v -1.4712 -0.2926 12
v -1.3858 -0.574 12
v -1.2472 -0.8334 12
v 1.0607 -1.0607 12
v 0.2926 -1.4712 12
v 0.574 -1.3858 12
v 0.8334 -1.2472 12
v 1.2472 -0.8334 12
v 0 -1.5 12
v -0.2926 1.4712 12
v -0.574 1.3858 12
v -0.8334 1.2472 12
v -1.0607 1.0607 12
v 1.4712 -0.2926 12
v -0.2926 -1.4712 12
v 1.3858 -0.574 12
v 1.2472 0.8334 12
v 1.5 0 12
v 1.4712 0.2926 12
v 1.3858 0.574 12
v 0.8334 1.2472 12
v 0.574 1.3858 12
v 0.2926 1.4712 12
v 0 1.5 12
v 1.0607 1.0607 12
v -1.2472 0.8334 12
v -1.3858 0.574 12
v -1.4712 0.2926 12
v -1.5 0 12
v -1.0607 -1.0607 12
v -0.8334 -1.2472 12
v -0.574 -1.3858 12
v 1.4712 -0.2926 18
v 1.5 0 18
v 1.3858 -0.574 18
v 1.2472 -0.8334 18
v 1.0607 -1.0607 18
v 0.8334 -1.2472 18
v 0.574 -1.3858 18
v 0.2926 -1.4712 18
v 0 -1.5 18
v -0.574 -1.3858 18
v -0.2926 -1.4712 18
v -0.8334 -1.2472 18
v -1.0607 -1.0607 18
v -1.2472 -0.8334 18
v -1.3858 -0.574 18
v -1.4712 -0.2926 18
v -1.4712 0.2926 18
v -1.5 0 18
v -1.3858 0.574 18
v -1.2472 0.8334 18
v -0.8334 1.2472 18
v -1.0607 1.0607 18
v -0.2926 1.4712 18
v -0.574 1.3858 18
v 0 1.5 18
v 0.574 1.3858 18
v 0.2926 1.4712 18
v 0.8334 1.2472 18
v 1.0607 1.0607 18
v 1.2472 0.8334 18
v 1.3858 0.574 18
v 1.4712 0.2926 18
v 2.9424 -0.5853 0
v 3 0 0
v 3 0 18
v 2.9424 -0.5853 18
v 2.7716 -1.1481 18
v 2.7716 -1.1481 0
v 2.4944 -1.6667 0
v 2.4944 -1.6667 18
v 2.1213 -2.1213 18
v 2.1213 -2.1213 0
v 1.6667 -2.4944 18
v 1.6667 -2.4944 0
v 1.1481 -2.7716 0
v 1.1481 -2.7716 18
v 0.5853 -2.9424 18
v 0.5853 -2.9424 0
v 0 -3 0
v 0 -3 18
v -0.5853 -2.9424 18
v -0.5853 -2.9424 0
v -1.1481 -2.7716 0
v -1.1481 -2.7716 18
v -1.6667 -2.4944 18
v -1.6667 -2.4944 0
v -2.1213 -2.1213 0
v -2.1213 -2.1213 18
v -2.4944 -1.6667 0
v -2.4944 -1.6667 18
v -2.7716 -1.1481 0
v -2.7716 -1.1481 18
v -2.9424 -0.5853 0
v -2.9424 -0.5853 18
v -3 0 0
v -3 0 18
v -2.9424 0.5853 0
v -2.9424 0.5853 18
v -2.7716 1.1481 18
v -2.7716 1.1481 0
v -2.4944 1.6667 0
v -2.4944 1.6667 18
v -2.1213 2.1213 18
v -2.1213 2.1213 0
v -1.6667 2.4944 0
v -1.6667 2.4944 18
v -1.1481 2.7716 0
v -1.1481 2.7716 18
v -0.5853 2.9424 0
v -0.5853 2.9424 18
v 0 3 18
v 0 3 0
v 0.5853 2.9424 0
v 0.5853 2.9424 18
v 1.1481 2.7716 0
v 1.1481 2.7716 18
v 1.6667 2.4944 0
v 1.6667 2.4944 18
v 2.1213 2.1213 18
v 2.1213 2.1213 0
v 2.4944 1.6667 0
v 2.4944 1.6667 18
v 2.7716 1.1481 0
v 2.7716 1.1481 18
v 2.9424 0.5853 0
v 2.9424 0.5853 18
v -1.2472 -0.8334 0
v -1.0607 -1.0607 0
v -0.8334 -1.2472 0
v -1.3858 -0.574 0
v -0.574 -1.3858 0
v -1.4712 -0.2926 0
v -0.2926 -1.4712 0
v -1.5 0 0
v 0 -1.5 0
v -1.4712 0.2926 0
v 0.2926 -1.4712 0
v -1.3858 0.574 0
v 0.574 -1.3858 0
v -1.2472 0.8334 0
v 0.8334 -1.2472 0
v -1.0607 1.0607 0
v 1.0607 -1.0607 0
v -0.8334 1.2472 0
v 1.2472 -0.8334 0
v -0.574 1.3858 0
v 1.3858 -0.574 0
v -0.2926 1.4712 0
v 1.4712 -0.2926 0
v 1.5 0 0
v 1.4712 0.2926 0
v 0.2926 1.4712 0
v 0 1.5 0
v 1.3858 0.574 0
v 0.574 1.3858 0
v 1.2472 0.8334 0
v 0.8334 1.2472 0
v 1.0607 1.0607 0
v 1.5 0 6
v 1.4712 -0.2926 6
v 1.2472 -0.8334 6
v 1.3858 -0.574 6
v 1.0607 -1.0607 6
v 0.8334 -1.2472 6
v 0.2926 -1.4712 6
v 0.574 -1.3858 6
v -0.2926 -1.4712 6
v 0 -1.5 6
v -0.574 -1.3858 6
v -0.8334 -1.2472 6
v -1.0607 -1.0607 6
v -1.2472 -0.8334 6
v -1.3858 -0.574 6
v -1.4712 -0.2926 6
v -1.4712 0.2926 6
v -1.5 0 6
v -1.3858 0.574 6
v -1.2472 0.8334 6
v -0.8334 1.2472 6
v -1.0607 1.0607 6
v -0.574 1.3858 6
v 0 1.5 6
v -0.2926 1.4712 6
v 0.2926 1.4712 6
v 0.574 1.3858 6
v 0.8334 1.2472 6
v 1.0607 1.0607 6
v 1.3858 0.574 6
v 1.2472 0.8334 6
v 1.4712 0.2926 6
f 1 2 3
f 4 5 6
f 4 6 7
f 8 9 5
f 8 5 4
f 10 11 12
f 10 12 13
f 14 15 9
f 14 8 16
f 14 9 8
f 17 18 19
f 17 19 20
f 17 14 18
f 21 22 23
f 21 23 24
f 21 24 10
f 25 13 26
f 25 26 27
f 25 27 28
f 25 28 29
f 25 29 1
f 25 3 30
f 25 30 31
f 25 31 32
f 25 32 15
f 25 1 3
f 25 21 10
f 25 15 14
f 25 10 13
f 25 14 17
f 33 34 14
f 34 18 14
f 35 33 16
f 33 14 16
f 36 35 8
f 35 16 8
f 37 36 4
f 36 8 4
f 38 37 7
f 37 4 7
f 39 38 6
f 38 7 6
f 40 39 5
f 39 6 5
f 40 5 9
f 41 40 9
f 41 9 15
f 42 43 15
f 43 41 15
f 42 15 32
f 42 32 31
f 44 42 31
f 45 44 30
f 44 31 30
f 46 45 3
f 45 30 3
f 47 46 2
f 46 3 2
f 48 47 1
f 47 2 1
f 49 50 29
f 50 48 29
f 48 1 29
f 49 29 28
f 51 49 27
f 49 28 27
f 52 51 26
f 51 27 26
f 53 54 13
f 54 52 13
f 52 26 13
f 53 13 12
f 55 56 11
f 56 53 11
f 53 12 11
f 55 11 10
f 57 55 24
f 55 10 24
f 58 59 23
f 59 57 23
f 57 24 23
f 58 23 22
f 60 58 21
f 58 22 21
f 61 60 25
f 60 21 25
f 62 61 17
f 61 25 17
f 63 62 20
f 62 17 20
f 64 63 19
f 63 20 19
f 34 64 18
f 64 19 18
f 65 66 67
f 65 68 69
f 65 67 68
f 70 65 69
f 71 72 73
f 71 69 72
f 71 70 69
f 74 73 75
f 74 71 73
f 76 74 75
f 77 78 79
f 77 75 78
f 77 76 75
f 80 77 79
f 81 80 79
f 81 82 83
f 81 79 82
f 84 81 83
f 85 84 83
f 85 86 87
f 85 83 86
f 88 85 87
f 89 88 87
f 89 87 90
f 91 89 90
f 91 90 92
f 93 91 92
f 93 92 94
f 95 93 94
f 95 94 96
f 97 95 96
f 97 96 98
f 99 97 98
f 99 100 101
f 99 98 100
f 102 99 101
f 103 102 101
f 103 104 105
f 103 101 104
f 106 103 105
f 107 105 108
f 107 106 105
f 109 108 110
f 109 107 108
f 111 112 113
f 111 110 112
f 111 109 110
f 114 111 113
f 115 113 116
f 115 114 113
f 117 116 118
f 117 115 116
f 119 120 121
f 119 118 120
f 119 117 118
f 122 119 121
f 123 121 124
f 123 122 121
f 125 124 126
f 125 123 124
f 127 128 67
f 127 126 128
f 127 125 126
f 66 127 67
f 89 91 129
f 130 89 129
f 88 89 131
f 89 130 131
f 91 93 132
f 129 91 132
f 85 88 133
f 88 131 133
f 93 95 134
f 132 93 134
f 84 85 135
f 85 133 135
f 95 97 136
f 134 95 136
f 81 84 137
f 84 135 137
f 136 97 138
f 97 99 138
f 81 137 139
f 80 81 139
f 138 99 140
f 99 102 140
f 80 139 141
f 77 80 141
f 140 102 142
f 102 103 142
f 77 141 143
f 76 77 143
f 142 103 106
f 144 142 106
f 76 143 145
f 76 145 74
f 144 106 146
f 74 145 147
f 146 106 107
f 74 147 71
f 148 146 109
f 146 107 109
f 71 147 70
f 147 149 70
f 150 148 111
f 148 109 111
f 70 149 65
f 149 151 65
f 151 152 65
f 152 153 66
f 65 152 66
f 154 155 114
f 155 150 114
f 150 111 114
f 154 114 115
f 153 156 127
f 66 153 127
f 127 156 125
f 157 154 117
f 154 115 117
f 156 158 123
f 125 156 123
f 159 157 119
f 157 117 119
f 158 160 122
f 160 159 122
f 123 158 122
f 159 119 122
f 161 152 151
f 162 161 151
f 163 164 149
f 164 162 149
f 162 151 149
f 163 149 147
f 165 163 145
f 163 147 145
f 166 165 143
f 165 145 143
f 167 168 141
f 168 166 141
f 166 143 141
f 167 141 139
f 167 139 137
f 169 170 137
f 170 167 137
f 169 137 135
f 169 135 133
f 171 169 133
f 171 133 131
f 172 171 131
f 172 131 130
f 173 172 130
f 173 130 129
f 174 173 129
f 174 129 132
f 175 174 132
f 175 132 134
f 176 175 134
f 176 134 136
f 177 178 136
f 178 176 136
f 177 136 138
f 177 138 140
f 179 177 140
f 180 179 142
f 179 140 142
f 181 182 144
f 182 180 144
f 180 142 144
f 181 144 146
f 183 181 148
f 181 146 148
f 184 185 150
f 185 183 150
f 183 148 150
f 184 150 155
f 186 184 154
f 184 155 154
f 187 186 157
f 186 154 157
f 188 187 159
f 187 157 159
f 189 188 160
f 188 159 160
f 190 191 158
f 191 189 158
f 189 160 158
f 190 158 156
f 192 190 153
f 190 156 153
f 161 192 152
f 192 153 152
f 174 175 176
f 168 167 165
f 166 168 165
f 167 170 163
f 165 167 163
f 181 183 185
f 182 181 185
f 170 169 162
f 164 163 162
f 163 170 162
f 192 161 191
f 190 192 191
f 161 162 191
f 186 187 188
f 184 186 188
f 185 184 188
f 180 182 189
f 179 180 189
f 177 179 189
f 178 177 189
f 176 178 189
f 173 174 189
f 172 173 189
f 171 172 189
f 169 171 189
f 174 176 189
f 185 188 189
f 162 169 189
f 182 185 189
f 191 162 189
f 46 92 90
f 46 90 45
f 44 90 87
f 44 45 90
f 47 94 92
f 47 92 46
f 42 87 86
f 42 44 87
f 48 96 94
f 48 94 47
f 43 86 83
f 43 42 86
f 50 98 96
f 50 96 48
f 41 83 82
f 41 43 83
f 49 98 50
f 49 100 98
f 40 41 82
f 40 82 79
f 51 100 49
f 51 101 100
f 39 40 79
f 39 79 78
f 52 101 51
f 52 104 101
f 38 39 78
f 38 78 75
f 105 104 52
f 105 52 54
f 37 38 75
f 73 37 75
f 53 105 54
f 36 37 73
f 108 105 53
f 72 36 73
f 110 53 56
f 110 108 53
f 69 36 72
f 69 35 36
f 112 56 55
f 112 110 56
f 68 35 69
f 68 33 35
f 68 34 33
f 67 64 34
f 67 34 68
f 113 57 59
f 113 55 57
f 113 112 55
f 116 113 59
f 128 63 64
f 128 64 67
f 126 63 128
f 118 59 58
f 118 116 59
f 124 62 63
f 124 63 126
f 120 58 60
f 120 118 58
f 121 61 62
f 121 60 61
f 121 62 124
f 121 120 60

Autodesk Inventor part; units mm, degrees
ref_plane "YZ Plane" through (0, 0, 0) normal (1, 0, 0) x (0, 1, 0)
ref_plane "XZ Plane" through (0, 0, 0) normal (0, 1, 0) x (-1, 0, 0)
sketch "スケッチ1" plane through (0, 0, 0) normal (0, 0, 1) x (1, 0, 0)
  circle A0 centre (0, 0) radius 3
  circle A1 centre (0, 0) radius 1.5
  dimension "d0" = 6
  dimension "d1" = 3
extrude "押し出し1" add sketch "スケッチ1" along normal blind 18
ref_plane "作業平面1" through (0, 0, 12) normal (0, 0, 1) x (1, 0, 0)
sketch "スケッチ3" plane through (0, 0, 12) normal (0, 0, 1) x (1, 0, 0)
  circle A0 centre (0, 0) radius 1.5 projected
  circle A1 centre (0, 0) radius 3 projected
extrude "押し出し2" add sketch "スケッチ3" against normal blind 6 contours A0
properties part number "スペーサーm3-18　簡易筒型" material "アルミニウム 2014-T4"
